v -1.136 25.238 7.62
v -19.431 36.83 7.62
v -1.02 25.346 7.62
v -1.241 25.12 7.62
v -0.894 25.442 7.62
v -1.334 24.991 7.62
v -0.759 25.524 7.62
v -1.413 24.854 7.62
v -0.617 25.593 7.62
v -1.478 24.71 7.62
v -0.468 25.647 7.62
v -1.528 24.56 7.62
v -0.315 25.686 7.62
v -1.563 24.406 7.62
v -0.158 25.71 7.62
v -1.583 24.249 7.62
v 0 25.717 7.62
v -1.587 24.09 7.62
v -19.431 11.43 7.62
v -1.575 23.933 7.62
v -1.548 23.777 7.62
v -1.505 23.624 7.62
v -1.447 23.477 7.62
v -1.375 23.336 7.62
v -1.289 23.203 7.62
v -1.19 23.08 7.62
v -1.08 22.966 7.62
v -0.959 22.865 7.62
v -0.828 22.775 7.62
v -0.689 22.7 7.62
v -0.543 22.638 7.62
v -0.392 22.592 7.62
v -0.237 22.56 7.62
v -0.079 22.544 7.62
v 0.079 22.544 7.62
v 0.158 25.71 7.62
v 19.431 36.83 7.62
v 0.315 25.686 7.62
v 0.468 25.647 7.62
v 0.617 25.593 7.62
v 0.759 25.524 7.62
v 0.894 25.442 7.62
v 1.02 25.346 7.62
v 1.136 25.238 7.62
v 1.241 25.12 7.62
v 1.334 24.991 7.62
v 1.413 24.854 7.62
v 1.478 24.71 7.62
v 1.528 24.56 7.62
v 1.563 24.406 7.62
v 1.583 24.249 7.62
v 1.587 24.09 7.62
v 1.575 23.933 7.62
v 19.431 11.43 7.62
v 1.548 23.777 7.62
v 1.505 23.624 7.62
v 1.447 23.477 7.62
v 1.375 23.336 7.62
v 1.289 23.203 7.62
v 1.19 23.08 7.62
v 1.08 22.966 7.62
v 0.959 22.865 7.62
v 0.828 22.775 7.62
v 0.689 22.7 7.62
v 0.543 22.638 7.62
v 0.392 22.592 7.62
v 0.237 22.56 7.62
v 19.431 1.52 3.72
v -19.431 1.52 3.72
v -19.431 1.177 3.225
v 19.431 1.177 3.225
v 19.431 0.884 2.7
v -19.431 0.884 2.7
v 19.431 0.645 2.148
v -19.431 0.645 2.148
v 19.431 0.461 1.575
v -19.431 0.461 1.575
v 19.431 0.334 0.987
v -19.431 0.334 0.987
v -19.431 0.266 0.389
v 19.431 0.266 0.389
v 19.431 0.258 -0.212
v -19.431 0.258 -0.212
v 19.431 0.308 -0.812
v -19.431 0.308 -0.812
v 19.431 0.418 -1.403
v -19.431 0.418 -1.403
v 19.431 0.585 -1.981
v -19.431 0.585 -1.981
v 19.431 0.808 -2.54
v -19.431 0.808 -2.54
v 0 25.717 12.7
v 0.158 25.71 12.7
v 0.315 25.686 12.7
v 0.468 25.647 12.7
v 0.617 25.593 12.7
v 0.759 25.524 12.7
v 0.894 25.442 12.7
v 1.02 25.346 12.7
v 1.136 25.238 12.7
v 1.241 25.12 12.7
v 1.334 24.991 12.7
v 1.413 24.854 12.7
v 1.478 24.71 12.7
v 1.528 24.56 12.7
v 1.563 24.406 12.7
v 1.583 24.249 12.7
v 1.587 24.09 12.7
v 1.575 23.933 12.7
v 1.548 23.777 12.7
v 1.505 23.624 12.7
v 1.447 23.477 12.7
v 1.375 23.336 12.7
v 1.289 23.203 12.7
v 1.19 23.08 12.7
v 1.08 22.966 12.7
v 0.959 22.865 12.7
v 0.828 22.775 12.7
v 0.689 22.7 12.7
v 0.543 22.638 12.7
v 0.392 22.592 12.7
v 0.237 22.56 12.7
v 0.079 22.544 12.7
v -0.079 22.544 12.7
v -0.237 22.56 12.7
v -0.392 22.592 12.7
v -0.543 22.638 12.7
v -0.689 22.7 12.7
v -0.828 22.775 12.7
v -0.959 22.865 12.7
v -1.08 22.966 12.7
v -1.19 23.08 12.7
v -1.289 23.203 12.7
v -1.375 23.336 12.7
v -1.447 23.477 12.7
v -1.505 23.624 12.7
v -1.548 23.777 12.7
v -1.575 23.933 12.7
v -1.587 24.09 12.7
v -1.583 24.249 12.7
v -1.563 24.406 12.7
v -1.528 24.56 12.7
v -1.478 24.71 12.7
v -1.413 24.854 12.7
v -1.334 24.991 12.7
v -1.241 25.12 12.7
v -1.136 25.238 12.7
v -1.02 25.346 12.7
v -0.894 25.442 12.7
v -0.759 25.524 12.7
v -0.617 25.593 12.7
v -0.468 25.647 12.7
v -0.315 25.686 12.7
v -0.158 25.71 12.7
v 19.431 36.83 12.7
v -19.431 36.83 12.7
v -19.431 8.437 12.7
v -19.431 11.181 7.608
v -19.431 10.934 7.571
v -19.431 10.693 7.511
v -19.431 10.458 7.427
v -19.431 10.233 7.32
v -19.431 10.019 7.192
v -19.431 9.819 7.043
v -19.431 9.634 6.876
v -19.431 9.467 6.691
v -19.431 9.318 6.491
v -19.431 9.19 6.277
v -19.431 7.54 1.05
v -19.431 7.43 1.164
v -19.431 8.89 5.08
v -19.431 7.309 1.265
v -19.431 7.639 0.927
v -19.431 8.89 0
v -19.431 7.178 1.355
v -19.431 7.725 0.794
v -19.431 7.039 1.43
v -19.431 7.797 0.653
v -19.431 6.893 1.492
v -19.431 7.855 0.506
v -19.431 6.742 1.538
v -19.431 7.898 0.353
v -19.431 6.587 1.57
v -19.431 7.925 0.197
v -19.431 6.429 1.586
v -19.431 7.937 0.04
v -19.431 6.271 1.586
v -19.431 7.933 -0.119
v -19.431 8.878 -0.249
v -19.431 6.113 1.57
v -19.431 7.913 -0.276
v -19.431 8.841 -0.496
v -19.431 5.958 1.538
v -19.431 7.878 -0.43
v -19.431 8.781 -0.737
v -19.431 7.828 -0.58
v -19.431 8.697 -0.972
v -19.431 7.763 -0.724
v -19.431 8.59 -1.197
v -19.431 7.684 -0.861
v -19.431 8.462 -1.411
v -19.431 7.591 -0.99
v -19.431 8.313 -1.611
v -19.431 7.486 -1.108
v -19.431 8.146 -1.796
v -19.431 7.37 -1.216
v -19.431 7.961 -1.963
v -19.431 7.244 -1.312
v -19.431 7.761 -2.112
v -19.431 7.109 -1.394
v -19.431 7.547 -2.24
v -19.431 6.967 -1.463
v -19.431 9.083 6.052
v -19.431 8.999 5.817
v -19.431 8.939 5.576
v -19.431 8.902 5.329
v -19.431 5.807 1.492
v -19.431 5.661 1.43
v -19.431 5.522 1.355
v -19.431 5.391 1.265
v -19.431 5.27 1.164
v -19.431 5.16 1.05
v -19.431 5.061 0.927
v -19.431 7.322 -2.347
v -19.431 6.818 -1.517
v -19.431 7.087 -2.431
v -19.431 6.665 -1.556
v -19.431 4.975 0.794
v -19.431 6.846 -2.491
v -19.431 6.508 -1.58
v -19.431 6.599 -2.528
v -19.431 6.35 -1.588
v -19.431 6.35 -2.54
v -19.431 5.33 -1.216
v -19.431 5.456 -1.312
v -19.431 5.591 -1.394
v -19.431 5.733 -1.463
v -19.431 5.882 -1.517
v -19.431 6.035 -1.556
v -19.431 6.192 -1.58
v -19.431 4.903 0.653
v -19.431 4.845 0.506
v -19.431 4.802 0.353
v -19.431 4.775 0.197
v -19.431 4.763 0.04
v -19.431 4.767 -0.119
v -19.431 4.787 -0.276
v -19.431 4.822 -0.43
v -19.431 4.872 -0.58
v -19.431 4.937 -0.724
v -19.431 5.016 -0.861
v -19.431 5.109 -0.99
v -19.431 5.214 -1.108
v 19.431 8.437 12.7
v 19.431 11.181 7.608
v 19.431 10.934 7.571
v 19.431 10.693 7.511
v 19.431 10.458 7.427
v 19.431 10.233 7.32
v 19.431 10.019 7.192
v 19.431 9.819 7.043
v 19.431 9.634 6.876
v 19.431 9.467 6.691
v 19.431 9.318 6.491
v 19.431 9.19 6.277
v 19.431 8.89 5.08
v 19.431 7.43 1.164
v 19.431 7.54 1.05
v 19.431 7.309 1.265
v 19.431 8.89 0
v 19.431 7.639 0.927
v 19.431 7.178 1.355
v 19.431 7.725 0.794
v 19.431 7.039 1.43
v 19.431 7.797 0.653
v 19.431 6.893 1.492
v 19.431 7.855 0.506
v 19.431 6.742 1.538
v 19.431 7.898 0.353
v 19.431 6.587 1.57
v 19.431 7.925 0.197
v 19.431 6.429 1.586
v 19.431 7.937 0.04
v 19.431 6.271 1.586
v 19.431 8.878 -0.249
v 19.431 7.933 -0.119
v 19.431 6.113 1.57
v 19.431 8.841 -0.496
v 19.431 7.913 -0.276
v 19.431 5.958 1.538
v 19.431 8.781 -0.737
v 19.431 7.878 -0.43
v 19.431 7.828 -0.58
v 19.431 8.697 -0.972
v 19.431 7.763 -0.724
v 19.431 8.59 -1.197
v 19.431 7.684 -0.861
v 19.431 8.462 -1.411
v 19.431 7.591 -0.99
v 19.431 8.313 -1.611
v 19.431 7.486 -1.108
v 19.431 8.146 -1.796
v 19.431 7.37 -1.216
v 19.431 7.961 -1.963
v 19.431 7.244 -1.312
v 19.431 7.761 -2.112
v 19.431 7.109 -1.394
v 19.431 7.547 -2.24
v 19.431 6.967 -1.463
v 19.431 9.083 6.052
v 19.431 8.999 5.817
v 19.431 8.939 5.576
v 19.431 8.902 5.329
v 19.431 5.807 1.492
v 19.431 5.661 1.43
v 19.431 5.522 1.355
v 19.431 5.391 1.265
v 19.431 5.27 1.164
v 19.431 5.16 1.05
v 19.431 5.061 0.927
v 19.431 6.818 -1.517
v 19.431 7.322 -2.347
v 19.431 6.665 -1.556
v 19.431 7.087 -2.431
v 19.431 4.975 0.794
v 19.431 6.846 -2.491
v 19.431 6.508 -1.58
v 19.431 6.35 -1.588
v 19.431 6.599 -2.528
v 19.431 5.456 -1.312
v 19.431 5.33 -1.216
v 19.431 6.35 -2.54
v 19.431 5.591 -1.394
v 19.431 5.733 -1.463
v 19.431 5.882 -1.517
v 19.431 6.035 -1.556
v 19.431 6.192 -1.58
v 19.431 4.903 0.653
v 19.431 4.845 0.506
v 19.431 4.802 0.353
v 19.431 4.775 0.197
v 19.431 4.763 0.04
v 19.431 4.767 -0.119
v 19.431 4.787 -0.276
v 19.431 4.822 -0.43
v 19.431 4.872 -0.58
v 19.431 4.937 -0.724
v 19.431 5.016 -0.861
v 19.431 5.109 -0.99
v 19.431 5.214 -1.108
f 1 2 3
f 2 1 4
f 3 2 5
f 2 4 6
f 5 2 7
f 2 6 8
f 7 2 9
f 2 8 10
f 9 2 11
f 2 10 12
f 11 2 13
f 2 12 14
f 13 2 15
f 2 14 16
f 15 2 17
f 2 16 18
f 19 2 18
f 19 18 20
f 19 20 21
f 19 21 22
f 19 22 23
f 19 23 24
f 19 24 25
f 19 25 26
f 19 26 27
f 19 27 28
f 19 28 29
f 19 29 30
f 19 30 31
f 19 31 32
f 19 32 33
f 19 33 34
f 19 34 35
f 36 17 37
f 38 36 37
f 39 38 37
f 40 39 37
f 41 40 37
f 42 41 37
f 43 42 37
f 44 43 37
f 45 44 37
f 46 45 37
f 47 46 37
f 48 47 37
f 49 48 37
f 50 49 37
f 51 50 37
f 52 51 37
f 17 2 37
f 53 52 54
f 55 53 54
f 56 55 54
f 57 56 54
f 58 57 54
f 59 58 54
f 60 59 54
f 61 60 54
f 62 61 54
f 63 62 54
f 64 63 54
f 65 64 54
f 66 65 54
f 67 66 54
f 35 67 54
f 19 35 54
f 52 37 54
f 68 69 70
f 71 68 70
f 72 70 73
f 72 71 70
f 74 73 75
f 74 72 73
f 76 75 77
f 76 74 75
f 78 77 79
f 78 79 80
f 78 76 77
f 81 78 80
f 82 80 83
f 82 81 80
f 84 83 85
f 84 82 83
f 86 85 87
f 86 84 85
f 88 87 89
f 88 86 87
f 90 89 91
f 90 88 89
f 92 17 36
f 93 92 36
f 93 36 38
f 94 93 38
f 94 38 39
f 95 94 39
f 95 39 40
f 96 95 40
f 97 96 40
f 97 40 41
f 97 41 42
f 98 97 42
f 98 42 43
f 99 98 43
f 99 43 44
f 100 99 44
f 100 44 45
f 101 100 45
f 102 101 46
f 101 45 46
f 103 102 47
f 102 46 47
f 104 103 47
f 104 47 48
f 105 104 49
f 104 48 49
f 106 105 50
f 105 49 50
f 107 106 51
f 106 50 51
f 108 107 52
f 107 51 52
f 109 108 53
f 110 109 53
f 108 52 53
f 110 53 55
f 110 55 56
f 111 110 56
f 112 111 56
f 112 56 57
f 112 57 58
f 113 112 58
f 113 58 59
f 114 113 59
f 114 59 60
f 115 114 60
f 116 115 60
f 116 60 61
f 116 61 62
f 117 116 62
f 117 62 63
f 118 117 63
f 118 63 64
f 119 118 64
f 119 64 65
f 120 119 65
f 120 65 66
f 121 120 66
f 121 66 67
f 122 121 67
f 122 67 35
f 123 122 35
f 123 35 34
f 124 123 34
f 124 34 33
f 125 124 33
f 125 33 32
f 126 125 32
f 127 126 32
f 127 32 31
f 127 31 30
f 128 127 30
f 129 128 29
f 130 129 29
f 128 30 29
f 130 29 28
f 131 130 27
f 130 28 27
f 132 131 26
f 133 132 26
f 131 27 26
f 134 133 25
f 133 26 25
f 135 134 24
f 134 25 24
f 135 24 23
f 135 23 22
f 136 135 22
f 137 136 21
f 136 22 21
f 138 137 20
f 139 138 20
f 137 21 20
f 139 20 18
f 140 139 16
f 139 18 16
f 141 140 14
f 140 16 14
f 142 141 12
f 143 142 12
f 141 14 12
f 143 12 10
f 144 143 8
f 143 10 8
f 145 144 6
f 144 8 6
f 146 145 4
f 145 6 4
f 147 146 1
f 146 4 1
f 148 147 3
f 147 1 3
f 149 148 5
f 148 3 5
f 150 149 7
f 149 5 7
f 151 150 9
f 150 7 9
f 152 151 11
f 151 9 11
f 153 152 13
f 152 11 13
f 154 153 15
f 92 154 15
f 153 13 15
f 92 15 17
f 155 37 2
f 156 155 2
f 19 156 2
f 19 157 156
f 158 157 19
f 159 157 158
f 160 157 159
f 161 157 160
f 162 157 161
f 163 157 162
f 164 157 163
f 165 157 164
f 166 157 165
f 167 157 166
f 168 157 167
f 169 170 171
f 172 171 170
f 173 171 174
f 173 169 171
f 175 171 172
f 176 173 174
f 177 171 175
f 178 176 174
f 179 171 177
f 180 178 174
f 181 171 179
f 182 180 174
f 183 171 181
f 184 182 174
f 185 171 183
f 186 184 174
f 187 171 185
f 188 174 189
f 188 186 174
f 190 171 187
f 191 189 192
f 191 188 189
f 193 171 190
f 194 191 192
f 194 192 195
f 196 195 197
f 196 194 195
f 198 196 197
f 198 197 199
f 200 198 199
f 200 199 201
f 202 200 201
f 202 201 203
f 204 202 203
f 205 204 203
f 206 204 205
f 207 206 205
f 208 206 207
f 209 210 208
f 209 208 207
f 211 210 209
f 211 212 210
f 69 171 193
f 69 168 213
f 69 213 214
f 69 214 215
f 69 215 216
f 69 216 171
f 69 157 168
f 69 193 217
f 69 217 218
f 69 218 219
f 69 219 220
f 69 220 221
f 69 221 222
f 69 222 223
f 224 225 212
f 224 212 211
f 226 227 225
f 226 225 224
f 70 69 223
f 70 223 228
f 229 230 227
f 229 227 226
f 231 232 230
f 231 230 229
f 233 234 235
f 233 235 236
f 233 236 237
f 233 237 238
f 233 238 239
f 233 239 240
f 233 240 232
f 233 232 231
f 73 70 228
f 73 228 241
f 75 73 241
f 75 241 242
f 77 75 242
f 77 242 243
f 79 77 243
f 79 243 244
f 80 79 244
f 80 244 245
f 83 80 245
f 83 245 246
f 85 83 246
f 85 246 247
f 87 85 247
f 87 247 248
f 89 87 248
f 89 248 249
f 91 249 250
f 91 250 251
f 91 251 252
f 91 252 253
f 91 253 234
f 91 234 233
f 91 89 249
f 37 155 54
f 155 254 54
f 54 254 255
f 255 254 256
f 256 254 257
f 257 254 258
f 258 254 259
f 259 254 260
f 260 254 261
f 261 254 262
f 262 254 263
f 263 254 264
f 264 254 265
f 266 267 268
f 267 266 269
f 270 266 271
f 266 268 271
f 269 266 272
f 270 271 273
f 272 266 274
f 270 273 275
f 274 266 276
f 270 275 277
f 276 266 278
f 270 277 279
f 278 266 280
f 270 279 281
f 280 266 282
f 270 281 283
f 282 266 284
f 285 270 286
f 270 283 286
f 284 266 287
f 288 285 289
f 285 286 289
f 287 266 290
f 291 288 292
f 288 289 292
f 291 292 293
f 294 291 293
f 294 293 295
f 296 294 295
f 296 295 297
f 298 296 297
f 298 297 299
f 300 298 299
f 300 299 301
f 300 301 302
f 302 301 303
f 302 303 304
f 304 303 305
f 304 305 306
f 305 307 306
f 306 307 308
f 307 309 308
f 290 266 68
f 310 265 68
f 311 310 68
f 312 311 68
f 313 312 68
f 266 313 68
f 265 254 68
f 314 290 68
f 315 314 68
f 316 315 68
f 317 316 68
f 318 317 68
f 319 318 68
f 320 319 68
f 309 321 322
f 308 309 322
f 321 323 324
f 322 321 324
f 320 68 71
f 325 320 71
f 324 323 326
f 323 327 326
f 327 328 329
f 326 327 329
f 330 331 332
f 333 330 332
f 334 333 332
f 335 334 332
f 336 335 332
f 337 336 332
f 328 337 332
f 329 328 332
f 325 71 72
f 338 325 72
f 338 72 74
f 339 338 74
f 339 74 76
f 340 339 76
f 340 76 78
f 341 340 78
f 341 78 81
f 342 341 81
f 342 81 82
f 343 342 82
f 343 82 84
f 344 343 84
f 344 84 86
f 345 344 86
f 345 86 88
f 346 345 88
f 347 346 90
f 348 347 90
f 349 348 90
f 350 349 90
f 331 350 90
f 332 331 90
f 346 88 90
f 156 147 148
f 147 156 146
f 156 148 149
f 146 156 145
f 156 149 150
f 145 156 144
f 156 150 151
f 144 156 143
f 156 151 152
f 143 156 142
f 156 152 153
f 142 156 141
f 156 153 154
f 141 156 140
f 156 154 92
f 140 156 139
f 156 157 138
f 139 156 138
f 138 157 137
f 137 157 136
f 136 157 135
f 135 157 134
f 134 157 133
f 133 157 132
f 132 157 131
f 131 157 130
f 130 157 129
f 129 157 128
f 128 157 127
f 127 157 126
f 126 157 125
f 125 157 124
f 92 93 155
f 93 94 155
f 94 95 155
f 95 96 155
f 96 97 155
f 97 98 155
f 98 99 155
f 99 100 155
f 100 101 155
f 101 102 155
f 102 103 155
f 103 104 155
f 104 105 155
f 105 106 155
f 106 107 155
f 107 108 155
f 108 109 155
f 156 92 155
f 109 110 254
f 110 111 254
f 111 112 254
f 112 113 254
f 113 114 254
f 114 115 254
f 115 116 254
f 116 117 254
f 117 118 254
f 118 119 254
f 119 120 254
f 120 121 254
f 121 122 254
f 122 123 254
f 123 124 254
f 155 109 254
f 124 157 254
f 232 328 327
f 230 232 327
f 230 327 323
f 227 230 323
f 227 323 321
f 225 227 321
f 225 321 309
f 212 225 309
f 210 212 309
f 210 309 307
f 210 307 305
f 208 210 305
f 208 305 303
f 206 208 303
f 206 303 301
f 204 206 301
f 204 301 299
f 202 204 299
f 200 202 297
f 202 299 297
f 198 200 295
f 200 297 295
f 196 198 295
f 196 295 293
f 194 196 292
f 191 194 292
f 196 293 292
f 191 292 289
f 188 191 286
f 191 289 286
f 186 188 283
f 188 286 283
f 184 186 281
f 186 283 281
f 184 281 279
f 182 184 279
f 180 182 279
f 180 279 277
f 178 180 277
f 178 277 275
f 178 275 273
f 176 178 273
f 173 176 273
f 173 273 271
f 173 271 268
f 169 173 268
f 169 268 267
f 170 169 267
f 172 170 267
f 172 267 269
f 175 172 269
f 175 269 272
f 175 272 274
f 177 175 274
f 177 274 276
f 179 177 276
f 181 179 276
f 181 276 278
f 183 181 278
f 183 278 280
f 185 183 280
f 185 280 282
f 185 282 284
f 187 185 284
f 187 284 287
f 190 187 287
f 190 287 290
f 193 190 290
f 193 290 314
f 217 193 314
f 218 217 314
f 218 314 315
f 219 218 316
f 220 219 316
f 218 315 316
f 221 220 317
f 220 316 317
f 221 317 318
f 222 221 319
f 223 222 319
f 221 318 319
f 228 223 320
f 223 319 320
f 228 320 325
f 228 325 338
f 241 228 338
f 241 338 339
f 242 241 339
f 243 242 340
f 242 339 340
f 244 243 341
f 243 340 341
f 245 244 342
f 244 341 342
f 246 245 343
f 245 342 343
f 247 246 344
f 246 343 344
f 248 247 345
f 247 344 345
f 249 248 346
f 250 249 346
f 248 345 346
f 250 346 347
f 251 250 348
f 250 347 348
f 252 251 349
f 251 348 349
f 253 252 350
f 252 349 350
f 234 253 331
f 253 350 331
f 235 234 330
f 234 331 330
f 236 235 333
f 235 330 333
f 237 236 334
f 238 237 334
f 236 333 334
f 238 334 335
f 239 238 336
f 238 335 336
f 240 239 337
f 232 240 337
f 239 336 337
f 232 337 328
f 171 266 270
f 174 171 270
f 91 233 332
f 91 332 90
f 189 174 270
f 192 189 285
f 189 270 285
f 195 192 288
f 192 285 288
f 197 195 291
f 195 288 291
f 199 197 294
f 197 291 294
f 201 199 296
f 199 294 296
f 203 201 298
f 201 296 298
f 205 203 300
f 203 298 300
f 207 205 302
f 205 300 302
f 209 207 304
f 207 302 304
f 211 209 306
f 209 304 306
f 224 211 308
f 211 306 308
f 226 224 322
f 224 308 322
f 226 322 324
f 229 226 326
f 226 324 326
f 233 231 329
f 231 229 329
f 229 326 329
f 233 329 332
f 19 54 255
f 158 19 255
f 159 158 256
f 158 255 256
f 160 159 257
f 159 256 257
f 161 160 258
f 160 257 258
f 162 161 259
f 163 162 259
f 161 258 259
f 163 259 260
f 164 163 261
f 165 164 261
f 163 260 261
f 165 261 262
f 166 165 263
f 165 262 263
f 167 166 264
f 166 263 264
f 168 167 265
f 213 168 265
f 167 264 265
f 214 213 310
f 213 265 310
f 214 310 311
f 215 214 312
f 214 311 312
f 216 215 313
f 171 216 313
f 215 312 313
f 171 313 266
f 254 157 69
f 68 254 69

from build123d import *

# Parameters (mm, degrees)
SKETCH1_W           = 38.862
SKETCH1_H           = 25.4
BOSS_EXTRUDE1_DEPTH = 17.78
SKETCH2_R           = 1.5875
CUT_EXTRUDE1_DEPTH  = 45.583331459
CUT_EXTRUDE2_DEPTH  = 45.583331459
SKETCH4_W           = 38.862
SKETCH4_H           = 25.4
BOSS_EXTRUDE2_DEPTH = 5.08
SKETCH5_R           = 1.5875
CUT_EXTRUDE3_DEPTH  = 25.4
CUT_EXTRUDE4_DEPTH  = 56.027210941
CUT_EXTRUDE5_DEPTH  = 56.027210941


with BuildPart() as part:
    # Sketch1 → Boss-Extrude1 (new body)
    with BuildSketch(Plane(origin=(0, 0, 0), x_dir=(1, 0, 0), z_dir=(0, 1, 0))):
        Rectangle(SKETCH1_W, SKETCH1_H)
    extrude(amount=BOSS_EXTRUDE1_DEPTH)

    # Sketch2 → Cut-Extrude1 (cut, through all)
    with BuildSketch(Plane(origin=(19.431, 0, 0), x_dir=(0, 0, -1), z_dir=(1, 0, 0))):
        with Locations((0, 6.35)):
            Circle(SKETCH2_R)
    extrude(amount=-CUT_EXTRUDE1_DEPTH, mode=Mode.SUBTRACT)

    # Sketch3 → Cut-Extrude2 (cut, through all)
    with BuildSketch(Plane(origin=(19.431, 0, 0), x_dir=(0, 0, -1), z_dir=(1, 0, 0))):
        with BuildLine():
            Line((-7.62, 17.78), (-7.62, 11.43))
            ThreePointArc((-7.62, 11.43), (-6.876051224, 9.633948776), (-5.08, 8.89))
            Line((-5.08, 8.89), (0, 8.89))
            ThreePointArc((0, 8.89), (1.796051224, 8.146051224), (2.54, 6.35))
            Line((2.54, 6.35), (2.54, 0))
            Line((2.54, 0), (12.7, 0))
            Line((12.7, 0), (12.7, 17.78))
            Line((12.7, 17.78), (-7.62, 17.78))
        make_face()
    extrude(amount=-CUT_EXTRUDE2_DEPTH, mode=Mode.SUBTRACT)

    # Sketch4 → Boss-Extrude2 (add)
    with BuildSketch(Plane(origin=(0, 0, 7.62), x_dir=(-1, 0, 0), z_dir=(0, 0, -1))):
        with Locations((0, 24.13)):
            Rectangle(SKETCH4_W, SKETCH4_H)
    extrude(amount=-BOSS_EXTRUDE2_DEPTH)

    # Sketch5 → Cut-Extrude3 (cut)
    with BuildSketch(Plane(origin=(0, 0, 7.62), x_dir=(-1, 0, 0), z_dir=(0, 0, -1))):
        with Locations(Location((0, 24.13, 0), (0, 0, 90))):
            Circle(SKETCH5_R)
    extrude(amount=-CUT_EXTRUDE3_DEPTH, mode=Mode.SUBTRACT)

    # Sketch6 → Cut-Extrude4 (cut, through all)
    with BuildSketch(Plane(origin=(19.431, 0, 0), x_dir=(0, 0, -1), z_dir=(1, 0, 0))):
        with BuildLine():
            ThreePointArc((2.1e-08, 0), (-2.046508636, 0.338818552), (-3.874625133, 1.319117366))
            Line((-3.874625133, 1.319117366), (-12.7, 8.116139232))
            Line((-12.7, 8.116139232), (-12.7, 0))
            Line((-12.7, 0), (2.1e-08, 0))
        make_face()
        with BuildLine():
            ThreePointArc((2.54, 0.530128867), (1.297366248, 0.133944915), (2.1e-08, 0))
            Line((2.1e-08, 0), (2.54, 0))
            Line((2.54, 0), (2.54, 0.530128867))
        make_face()
    extrude(amount=-CUT_EXTRUDE4_DEPTH, mode=Mode.SUBTRACT)

    # Sketch7 → Cut-Extrude5 (cut, through all)
    with BuildSketch(Plane(origin=(19.431, 0, 0), x_dir=(0, 0, -1), z_dir=(1, 0, 0))):
        with BuildLine():
            Line((-12.7, 8.436739039), (-3.719640128, 1.520352671))
            ThreePointArc((-3.719640128, 1.520352671), (-0.688923818, 0.293053577), (2.54, 0.808374246))
            Line((2.54, 0.808374246), (2.54, 0.530128867))
            ThreePointArc((2.54, 0.530128867), (-0.775197894, 0.047495083), (-3.874625133, 1.319117366))
            Line((-3.874625133, 1.319117366), (-12.7, 8.116139232))
            Line((-12.7, 8.116139232), (-12.7, 8.436739039))
        make_face()
    extrude(amount=-CUT_EXTRUDE5_DEPTH, mode=Mode.SUBTRACT)


solid = part.part
